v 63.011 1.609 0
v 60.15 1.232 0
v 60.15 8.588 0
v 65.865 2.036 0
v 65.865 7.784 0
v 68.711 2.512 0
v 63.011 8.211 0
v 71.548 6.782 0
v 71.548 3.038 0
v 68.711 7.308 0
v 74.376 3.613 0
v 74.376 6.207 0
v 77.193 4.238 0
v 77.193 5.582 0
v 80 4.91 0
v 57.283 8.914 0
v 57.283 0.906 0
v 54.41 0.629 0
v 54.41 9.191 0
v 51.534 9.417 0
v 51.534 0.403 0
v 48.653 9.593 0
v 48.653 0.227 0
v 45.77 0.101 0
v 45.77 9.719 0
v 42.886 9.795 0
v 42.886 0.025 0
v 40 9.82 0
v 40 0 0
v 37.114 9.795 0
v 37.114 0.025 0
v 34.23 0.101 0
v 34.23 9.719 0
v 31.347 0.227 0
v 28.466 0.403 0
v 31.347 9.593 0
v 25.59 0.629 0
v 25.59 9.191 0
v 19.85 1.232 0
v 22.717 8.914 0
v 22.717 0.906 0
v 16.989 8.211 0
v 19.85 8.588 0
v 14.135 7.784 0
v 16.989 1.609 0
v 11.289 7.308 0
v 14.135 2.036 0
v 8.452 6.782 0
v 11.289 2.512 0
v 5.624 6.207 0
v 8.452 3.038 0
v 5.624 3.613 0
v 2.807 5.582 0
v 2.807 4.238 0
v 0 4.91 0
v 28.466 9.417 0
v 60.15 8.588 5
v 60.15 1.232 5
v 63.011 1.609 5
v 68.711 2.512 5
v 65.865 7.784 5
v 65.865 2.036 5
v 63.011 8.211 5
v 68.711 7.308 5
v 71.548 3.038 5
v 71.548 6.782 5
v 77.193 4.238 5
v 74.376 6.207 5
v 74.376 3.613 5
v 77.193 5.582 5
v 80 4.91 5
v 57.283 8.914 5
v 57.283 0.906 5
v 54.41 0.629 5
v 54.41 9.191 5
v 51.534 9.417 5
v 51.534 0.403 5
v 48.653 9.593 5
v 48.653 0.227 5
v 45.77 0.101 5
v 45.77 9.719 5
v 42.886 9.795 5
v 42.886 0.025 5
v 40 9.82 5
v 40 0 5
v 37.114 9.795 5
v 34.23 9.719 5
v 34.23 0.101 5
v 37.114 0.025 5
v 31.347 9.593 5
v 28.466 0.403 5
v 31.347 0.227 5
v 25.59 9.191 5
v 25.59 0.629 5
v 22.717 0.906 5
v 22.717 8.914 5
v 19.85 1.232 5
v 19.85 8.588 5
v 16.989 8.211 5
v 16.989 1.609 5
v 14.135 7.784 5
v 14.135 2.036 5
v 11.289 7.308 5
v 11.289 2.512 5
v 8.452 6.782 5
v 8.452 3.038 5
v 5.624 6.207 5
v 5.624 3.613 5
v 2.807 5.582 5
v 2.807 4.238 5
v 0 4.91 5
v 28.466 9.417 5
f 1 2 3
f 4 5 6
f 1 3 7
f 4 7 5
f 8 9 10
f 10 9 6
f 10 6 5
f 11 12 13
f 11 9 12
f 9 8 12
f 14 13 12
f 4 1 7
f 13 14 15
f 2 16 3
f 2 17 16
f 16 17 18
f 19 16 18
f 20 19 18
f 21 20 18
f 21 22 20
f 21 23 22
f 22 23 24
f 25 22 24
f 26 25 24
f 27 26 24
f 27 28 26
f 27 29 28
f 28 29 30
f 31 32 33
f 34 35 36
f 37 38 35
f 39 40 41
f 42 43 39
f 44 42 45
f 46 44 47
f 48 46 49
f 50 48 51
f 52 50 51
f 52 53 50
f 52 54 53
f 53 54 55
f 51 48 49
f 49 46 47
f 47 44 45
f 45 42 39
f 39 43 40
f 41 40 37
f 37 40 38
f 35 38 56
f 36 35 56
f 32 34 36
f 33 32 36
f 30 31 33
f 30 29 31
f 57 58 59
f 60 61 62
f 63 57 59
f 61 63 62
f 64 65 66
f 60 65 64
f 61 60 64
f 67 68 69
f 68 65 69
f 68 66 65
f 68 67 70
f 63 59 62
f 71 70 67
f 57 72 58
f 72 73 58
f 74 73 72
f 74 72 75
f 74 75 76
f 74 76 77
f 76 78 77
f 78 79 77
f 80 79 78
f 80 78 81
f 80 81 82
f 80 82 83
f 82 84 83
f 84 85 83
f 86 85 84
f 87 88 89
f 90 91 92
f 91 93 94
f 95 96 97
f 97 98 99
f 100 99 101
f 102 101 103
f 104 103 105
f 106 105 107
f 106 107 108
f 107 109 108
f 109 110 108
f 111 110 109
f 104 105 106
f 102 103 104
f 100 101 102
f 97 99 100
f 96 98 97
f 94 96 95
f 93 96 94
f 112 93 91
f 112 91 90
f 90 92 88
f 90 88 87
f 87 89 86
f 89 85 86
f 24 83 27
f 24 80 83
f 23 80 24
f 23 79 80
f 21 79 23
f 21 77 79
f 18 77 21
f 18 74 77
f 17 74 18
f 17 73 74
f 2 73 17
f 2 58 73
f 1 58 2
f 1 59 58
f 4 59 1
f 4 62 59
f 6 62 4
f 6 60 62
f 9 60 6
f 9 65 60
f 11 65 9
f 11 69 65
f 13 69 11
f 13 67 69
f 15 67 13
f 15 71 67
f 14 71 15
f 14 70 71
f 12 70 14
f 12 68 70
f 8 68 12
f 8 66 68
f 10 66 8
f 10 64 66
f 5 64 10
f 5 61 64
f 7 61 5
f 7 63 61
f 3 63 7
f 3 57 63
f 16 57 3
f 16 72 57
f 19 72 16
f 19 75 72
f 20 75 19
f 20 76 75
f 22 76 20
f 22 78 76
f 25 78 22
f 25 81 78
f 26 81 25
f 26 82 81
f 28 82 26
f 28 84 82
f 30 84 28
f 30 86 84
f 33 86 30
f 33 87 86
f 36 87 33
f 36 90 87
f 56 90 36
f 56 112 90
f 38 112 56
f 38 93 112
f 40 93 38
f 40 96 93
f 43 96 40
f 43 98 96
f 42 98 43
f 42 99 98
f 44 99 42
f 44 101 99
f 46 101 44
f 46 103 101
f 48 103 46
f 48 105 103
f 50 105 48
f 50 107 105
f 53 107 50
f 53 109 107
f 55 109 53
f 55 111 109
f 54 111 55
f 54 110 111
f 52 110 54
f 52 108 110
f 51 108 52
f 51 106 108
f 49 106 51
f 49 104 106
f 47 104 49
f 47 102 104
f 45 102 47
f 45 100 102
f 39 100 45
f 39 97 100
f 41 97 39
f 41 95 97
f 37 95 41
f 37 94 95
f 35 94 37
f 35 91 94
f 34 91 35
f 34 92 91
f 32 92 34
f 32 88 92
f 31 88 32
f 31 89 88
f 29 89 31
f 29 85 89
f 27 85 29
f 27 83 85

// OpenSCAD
$fn = 32;

// ----------------------------------------------------------------------
// Arc profile plate: lens, 56 points
// ----------------------------------------------------------------------

// --- parameters (mm) ---
lens_chord = 80;          // chord length of the lens, X
arc_r = 165.34;           // radius of both arcs
arc_angle = 28;           // angle of each arc, degrees
sagitta = 4.91;           // bulge of each arc (half the lens height)
arc_step = 1;             // sampling step of the arcs, degrees
plate_t = 5;              // plate thickness, Z

bbox_y = 2 * sagitta;  // full lens height

profile = [[80, 4.91], [77.193, 5.582], [74.376, 6.207], [71.548, 6.782], [68.711, 7.308], [65.865, 7.784], [63.011, 8.211], [60.15, 8.588], [57.283, 8.914], [54.41, 9.191], [51.534, 9.417], [48.653, 9.593], [45.77, 9.719], [42.886, 9.795], [40, 9.82], [37.114, 9.795], [34.23, 9.719], [31.347, 9.593], [28.466, 9.417], [25.59, 9.191], [22.717, 8.914], [19.85, 8.588], [16.989, 8.211], [14.135, 7.784], [11.289, 7.308], [8.452, 6.782], [5.624, 6.207], [2.807, 5.582], [0, 4.91], [2.807, 4.238], [5.624, 3.613], [8.452, 3.038], [11.289, 2.512], [14.135, 2.036], [16.989, 1.609], [19.85, 1.232], [22.717, 0.906], [25.59, 0.629], [28.466, 0.403], [31.347, 0.227], [34.23, 0.101], [37.114, 0.025], [40, 0], [42.886, 0.025], [45.77, 0.101], [48.653, 0.227], [51.534, 0.403], [54.41, 0.629], [57.283, 0.906], [60.15, 1.232], [63.011, 1.609], [65.865, 2.036], [68.711, 2.512], [71.548, 3.038], [74.376, 3.613], [77.193, 4.238]];  // primary outline, 56 points, counter clockwise

// --- the one profile operation ---
linear_extrude(height = plate_t) polygon(points = profile);
